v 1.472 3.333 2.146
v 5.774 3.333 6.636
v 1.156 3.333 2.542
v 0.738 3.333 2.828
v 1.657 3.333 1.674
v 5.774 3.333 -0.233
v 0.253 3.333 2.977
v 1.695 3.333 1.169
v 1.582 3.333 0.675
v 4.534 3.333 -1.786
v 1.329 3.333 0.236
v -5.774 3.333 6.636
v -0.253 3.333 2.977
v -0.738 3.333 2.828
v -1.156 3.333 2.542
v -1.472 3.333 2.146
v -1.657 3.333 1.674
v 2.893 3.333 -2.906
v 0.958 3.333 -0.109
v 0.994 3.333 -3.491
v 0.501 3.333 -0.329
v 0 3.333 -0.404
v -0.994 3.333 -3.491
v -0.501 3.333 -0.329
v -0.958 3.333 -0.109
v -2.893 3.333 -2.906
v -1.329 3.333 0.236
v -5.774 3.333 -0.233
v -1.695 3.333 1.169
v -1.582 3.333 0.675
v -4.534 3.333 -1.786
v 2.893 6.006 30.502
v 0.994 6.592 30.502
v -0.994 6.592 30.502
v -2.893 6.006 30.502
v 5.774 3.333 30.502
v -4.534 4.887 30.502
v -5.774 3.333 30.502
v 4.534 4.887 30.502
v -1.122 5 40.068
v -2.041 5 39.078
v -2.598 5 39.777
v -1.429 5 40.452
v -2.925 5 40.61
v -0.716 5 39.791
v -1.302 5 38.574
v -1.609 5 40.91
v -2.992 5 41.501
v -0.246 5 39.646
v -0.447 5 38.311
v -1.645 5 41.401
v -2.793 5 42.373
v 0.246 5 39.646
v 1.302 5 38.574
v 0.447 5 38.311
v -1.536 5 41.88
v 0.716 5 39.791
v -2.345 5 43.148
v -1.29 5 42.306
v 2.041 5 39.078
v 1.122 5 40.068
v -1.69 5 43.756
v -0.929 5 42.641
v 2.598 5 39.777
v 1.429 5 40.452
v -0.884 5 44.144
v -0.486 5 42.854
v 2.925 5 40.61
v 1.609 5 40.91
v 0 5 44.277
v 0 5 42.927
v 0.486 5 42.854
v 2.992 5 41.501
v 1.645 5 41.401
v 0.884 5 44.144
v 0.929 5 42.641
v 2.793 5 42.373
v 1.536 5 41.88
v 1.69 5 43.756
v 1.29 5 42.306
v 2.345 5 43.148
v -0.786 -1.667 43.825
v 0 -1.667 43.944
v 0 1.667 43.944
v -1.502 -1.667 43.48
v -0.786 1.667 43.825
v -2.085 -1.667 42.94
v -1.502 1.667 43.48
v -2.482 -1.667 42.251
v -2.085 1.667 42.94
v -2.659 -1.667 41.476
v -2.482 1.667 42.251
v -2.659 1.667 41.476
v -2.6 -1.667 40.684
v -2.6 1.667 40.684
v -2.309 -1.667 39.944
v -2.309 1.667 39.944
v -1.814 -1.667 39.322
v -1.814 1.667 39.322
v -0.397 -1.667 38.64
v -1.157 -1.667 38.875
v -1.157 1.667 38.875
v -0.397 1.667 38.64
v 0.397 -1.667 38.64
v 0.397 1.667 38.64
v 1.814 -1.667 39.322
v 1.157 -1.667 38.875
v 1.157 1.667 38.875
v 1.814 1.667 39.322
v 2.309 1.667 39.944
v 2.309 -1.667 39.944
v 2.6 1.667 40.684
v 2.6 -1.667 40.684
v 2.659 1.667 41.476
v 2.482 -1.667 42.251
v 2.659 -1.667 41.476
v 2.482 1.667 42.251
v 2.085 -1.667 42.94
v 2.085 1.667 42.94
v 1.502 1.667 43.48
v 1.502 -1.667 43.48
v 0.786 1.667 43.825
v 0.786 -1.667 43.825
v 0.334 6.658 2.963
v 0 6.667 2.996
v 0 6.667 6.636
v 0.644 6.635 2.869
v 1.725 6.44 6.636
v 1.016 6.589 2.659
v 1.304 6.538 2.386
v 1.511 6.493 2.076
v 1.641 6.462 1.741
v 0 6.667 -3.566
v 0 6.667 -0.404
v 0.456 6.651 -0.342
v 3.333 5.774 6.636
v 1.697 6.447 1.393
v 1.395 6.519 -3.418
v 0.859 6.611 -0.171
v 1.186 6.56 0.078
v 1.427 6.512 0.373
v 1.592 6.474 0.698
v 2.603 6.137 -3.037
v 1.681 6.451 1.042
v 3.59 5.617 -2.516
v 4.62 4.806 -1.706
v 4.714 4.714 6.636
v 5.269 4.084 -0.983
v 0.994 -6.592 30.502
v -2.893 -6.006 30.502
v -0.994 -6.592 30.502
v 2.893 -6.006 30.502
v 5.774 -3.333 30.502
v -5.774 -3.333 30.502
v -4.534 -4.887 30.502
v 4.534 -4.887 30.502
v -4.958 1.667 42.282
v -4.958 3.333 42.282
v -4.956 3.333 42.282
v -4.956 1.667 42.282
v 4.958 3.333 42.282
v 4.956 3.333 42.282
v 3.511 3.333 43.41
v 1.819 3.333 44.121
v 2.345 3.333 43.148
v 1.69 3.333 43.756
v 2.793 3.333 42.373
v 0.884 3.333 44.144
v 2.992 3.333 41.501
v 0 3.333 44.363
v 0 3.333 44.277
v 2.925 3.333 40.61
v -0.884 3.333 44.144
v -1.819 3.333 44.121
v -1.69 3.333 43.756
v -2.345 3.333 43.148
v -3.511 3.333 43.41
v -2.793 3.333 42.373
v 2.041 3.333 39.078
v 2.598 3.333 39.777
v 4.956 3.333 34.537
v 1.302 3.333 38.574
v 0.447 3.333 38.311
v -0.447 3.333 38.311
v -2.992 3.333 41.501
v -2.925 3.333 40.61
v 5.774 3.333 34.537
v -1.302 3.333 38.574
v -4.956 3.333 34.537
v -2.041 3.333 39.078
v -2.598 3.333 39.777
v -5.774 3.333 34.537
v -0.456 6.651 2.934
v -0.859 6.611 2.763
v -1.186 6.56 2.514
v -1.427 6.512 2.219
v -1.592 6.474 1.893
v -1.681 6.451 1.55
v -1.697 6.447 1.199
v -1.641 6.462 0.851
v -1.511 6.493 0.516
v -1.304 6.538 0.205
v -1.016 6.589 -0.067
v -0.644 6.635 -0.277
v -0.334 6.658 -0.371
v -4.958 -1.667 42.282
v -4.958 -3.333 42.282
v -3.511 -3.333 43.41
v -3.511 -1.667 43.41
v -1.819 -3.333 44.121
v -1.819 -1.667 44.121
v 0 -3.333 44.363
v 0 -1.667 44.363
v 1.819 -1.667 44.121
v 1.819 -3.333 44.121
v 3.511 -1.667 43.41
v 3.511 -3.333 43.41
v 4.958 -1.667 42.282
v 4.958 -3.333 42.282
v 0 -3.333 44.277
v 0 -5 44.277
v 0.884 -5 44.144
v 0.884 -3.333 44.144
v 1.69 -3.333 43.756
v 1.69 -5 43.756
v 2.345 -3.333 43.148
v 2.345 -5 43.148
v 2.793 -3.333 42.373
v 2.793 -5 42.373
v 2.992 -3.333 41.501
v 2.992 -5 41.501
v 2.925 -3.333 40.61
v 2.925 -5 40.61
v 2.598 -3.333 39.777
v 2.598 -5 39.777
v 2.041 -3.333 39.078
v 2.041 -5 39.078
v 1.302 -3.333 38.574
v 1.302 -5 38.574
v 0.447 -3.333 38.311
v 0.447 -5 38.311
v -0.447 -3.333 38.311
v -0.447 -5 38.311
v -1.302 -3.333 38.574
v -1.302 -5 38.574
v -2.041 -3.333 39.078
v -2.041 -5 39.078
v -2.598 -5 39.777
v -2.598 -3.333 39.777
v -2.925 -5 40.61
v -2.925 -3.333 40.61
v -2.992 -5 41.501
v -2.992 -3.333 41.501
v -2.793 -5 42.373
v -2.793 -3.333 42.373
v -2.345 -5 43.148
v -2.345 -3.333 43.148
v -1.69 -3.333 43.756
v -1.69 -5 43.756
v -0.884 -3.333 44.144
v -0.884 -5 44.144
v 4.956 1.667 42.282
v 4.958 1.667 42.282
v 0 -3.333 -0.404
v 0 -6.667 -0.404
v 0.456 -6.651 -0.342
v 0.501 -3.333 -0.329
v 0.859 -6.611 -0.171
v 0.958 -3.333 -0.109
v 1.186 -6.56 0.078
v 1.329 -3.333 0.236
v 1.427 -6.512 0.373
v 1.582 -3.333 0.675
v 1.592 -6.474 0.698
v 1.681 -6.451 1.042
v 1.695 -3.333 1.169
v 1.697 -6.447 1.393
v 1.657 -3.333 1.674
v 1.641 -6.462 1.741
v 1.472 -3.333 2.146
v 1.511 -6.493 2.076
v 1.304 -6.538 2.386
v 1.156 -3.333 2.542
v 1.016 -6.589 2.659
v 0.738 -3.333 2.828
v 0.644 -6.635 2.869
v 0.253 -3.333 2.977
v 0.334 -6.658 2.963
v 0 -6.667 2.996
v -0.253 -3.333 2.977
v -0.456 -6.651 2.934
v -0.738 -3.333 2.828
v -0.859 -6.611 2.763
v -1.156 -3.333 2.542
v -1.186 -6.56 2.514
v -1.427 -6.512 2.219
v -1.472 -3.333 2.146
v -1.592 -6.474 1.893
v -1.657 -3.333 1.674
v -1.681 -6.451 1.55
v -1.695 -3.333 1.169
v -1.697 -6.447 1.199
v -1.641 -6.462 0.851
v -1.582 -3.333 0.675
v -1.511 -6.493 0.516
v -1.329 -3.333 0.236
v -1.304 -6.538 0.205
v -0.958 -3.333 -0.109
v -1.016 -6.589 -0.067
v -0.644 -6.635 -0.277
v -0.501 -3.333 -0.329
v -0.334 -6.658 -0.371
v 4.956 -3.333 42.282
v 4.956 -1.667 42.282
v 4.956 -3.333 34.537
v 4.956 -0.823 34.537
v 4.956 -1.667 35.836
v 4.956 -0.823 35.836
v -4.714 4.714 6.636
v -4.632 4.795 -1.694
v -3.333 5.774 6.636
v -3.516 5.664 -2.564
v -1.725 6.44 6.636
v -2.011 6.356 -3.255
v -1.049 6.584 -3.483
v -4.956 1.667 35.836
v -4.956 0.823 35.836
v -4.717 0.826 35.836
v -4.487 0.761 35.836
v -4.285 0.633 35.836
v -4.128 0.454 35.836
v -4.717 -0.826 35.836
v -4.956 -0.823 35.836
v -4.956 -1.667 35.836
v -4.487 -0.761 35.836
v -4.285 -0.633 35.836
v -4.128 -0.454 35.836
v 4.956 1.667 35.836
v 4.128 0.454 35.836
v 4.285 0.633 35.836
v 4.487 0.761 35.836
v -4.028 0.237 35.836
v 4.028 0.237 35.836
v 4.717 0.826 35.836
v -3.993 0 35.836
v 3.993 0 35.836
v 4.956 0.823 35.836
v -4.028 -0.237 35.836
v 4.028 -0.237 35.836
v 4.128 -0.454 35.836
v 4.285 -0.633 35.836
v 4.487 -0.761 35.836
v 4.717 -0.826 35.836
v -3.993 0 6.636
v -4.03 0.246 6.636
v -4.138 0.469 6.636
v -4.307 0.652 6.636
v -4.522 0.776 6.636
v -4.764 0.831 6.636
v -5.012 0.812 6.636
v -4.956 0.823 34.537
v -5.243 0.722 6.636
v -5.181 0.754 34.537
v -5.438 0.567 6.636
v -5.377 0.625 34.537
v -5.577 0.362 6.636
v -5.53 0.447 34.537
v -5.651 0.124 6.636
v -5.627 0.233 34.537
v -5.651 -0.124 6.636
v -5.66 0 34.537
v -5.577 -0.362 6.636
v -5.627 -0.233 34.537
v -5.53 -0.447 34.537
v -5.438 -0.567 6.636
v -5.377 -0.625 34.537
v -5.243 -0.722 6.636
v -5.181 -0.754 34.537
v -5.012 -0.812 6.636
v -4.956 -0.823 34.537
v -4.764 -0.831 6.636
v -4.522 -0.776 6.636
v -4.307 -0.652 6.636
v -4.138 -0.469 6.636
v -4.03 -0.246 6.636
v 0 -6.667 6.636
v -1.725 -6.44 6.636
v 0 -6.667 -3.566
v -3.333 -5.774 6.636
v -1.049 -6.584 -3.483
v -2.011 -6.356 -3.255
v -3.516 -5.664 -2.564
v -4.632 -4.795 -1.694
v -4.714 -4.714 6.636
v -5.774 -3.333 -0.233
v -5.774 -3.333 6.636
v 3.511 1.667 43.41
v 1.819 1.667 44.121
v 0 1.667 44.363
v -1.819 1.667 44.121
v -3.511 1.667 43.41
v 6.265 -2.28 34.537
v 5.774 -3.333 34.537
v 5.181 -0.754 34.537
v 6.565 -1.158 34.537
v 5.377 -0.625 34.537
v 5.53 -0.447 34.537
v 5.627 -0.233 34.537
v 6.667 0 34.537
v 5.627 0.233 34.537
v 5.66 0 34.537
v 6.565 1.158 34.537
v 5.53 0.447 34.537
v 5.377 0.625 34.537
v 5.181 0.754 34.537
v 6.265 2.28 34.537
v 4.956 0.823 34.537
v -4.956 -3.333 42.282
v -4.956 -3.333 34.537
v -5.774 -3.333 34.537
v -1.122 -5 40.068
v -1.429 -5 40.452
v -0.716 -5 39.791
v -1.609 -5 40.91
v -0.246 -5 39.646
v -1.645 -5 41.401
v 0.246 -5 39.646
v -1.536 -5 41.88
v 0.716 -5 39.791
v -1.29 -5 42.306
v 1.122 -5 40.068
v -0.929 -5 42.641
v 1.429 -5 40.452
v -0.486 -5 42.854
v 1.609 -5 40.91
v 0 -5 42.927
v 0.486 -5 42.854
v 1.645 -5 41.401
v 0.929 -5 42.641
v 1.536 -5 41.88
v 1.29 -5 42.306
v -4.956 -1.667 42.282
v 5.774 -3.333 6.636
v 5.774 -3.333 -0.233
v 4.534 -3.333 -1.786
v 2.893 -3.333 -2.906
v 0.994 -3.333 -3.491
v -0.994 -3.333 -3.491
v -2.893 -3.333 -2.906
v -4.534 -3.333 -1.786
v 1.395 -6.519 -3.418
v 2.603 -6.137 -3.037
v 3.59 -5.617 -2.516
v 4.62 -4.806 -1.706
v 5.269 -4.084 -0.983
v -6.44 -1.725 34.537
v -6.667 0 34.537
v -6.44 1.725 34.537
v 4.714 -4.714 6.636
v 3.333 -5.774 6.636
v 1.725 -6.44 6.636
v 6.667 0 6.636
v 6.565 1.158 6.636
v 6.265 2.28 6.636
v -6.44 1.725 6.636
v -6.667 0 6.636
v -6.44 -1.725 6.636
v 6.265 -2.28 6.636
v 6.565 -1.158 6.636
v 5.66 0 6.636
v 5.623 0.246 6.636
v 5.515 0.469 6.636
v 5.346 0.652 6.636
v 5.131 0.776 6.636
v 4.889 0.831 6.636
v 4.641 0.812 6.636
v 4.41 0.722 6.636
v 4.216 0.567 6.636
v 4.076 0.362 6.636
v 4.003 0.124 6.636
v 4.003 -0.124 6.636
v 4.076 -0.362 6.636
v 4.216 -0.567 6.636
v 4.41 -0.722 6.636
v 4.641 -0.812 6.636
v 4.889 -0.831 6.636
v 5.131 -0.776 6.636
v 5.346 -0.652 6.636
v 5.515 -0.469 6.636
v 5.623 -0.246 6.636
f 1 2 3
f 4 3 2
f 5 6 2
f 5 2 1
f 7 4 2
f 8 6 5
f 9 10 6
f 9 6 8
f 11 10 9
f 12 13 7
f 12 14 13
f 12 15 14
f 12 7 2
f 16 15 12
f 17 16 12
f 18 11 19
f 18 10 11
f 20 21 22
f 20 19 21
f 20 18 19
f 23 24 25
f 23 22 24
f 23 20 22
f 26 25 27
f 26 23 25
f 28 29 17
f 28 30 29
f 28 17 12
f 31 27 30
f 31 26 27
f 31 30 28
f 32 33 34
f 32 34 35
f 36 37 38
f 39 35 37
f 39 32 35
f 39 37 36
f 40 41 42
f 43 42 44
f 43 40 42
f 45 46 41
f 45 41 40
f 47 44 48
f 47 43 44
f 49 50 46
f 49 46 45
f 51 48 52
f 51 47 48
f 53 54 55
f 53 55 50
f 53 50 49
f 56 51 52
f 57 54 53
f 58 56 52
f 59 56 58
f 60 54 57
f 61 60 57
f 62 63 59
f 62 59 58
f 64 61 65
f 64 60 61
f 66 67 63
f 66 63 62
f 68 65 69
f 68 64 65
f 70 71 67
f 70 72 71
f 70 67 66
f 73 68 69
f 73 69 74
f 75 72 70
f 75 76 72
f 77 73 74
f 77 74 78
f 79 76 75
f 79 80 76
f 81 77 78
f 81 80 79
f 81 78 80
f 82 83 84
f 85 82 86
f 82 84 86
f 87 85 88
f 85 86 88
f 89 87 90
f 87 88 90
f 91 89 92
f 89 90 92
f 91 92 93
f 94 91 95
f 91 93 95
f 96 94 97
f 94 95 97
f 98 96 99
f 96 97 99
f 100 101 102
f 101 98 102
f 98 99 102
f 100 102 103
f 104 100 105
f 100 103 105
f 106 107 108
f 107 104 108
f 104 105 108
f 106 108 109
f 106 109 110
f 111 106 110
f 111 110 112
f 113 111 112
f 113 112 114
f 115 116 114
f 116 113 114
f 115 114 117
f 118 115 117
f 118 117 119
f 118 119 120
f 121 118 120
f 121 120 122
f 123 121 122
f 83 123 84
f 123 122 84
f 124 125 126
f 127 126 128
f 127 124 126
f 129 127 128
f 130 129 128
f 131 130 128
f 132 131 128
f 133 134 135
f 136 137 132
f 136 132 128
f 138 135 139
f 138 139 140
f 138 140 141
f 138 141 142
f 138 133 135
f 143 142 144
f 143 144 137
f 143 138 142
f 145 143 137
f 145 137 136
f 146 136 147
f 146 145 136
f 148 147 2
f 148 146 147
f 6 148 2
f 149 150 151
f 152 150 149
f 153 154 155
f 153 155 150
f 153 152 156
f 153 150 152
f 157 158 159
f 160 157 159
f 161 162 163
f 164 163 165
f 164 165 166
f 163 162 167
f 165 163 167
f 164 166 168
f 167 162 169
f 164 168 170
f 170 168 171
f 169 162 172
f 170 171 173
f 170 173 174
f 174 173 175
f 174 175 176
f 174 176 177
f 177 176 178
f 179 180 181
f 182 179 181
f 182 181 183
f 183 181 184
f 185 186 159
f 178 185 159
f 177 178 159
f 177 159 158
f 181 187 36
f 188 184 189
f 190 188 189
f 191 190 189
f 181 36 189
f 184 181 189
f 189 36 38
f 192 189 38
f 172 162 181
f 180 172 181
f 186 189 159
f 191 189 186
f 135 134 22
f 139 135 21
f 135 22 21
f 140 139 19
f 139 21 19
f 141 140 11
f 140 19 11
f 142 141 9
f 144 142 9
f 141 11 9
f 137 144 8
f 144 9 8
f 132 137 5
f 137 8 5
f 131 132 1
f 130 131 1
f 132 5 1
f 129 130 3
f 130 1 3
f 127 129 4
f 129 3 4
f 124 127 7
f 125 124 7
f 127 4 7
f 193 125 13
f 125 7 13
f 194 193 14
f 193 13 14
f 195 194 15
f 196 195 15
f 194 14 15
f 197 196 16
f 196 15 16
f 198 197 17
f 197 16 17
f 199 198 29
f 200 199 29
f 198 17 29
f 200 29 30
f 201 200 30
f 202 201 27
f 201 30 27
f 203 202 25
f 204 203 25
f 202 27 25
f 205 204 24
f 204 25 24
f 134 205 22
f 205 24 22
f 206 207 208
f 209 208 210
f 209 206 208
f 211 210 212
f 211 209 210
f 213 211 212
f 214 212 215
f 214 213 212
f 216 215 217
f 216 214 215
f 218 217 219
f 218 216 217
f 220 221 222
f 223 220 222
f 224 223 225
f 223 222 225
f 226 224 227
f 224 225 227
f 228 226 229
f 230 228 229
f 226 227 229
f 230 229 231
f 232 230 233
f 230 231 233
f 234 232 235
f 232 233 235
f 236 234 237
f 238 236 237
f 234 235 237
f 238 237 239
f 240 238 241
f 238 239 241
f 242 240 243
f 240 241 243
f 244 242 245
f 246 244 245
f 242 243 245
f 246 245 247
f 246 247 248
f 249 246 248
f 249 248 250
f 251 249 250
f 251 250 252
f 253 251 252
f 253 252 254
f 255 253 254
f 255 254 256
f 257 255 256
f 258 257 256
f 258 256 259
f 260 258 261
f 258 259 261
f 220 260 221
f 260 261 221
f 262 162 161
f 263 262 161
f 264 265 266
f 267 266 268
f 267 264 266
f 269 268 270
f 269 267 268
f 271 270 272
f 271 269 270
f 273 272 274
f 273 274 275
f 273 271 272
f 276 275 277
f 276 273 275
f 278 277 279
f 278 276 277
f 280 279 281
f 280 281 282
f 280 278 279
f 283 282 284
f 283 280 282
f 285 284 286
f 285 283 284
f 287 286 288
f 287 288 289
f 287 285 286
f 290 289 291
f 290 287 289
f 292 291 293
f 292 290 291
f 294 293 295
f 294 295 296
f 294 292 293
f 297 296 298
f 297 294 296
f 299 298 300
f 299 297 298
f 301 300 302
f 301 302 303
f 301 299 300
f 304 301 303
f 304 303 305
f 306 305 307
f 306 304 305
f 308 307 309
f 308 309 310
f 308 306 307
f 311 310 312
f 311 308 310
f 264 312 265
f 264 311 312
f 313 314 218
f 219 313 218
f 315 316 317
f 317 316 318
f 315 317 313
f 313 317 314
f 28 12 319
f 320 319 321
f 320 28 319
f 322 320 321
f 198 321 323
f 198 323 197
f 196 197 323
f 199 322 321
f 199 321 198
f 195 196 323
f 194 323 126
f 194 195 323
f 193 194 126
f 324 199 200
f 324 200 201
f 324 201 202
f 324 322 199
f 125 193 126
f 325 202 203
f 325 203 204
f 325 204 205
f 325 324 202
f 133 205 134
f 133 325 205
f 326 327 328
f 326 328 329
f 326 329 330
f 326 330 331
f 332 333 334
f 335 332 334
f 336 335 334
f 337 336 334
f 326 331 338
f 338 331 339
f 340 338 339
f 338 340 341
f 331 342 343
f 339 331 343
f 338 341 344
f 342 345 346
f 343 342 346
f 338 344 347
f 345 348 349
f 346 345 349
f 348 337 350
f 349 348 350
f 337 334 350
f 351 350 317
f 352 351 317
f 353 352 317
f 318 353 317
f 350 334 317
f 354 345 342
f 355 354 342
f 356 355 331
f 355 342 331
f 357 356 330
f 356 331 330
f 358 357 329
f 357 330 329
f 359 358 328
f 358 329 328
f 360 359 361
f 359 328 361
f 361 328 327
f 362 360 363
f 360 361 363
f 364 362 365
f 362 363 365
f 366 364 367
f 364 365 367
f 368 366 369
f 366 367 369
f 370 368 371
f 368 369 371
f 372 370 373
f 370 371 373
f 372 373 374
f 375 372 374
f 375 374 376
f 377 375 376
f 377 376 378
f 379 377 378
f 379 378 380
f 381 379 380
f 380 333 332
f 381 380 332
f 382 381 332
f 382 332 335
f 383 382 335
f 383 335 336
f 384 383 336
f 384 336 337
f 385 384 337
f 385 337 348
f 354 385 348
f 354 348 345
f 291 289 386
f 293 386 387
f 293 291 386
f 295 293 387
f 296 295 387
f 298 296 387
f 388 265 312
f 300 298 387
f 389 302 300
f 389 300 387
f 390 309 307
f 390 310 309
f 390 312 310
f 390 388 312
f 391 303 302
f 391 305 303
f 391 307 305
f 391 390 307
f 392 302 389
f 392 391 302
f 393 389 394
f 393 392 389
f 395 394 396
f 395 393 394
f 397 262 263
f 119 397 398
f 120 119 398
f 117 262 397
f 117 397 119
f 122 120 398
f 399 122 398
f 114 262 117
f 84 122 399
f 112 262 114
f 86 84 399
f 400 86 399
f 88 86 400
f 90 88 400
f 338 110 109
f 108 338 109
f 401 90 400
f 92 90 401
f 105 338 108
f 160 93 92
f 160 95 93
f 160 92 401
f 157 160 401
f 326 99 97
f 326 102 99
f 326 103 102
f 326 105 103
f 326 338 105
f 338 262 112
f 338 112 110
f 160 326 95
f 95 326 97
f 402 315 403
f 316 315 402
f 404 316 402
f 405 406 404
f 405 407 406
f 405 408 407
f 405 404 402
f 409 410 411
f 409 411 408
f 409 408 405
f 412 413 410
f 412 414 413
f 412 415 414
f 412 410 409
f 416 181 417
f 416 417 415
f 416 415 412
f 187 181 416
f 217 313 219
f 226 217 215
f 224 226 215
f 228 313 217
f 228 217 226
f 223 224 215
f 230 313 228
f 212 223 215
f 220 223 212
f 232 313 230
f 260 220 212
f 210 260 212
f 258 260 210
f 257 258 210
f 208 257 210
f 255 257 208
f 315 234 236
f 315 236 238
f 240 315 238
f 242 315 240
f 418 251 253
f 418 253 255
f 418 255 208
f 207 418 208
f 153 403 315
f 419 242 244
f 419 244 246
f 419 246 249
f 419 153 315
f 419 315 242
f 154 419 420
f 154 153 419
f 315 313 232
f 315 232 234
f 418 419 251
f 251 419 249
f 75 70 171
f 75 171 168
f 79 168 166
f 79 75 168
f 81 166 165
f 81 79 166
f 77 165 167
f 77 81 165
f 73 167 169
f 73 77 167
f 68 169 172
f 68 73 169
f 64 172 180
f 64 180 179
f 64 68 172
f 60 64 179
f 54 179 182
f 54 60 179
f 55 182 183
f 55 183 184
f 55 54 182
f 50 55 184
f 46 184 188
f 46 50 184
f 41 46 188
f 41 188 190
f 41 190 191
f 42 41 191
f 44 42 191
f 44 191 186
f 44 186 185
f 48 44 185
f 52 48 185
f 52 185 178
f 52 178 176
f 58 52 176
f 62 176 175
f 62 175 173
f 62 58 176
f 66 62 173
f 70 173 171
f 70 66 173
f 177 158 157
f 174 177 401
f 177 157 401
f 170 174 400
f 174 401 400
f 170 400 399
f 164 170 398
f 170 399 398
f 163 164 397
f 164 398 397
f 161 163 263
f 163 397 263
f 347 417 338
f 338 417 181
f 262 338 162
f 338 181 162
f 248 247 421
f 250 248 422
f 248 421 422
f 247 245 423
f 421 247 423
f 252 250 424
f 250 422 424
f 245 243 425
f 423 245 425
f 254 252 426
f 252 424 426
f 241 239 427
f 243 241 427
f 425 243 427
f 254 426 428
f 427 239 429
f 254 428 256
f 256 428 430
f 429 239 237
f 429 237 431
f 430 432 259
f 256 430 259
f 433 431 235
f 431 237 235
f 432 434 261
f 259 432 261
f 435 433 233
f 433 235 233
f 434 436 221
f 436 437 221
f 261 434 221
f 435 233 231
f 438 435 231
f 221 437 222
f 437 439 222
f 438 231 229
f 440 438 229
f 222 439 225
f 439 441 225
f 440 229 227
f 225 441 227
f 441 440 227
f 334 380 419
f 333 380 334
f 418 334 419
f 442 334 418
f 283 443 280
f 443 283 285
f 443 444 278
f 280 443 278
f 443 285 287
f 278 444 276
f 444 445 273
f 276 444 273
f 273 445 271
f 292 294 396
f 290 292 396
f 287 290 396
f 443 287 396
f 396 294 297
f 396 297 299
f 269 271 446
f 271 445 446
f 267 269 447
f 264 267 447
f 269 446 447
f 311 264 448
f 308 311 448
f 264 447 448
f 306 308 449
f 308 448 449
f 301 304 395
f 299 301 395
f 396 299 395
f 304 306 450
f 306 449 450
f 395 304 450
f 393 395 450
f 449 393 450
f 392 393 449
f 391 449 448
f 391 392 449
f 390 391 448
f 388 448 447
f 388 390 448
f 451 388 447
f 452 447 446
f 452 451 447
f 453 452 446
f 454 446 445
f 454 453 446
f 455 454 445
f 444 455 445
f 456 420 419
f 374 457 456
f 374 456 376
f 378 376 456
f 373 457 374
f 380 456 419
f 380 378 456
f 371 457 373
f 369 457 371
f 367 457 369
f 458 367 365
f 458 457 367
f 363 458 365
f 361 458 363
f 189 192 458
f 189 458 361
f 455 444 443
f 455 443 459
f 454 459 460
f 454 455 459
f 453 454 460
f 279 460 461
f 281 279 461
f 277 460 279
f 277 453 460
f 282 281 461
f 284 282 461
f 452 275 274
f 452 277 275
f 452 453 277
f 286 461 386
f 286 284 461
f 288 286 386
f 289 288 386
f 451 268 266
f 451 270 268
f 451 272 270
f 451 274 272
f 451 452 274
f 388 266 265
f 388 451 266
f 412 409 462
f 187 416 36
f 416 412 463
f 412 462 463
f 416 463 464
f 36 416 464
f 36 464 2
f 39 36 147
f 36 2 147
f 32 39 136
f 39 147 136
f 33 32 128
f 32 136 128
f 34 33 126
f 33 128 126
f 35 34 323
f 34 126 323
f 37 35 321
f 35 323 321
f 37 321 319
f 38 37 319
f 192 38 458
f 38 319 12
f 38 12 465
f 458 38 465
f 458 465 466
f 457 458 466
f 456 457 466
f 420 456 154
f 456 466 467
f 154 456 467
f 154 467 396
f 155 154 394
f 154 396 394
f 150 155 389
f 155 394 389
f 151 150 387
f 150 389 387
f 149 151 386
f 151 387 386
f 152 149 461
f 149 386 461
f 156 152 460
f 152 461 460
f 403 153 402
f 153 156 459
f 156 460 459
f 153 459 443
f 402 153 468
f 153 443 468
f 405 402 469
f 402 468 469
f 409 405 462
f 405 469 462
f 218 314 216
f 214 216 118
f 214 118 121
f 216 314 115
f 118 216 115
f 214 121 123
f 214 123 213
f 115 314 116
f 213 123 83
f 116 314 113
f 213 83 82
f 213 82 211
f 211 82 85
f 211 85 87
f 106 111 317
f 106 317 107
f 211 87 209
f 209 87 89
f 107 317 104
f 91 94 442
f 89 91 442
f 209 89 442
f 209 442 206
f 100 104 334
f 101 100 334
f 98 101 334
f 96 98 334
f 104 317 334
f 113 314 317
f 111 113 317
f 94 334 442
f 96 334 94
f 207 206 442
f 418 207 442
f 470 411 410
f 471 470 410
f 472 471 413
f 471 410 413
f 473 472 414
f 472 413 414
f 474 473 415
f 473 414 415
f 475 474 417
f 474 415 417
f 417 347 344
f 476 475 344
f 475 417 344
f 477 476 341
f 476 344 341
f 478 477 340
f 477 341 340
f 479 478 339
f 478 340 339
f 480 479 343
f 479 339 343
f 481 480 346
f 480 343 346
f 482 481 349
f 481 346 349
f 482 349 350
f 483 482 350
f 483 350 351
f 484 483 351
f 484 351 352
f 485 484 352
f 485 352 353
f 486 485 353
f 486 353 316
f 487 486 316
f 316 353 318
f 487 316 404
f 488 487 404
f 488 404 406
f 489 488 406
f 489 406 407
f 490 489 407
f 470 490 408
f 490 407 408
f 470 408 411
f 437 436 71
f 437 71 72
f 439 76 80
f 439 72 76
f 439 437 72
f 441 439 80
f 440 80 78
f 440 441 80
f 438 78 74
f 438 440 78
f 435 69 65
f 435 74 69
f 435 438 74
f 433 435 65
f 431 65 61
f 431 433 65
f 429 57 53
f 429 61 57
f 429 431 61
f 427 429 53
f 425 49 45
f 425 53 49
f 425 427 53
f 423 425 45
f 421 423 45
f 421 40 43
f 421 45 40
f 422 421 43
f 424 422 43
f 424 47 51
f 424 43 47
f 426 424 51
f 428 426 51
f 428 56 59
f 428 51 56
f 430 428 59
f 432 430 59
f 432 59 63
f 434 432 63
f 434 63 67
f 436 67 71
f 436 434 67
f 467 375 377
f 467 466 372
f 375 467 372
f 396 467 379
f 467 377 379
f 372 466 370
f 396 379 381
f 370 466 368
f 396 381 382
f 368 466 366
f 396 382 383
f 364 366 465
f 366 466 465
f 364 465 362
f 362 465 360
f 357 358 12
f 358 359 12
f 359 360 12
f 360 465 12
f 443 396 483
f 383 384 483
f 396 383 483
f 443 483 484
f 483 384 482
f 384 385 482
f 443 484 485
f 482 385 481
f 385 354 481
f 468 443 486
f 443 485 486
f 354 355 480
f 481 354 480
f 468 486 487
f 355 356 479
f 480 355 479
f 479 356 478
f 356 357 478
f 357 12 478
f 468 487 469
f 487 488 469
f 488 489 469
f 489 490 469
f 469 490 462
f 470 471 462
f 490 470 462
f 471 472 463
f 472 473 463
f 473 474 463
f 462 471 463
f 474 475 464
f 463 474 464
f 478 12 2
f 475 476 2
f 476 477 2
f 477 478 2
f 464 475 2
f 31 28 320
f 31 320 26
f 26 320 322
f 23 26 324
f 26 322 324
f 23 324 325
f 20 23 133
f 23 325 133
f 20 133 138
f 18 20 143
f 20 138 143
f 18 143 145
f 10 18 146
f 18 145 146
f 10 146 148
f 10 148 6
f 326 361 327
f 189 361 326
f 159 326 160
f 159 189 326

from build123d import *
from build123d.topology import SkipClean

# Parameters (mm, degrees)
SKETCH2_R                       = 10
PHALANGE_LENGTH_DEPTH           = 43.8
BOSS_EXTRUDE3_DEPTH             = 5
BOSS_EXTRUDE4_DEPTH             = 5
BOSS_EXTRUDE4_DEPTH_BACK        = 5
CUT_EXTRUDE2_START              = -15.3025
CUT_EXTRUDE2_DEPTH              = 15.3025
SKETCH7_R                       = 1.65
CUT_EXTRUDE3_DEPTH              = 10
CUT_EXTRUDE4_DEPTH              = 2.5
CUT_EXTRUDE4_DEPTH_BACK         = 2.5
CUT_EXTRUDE7_REACH              = 63.838
SKETCH4_R                       = 1.65
CUT_EXTRUDE7_DIRECTION_2_REACH  = 63.838
CUT_EXTRUDE_THIN1_START         = 43.8
CUT_EXTRUDE_THIN1_DEPTH         = 10.361670454
BOSS_EXTRUDE5_REACH             = 63.28
SKETCH9_R                       = 4
SKETCH9_R_2                     = 1.65
CUT_EXTRUDE8_REACH              = 62.771
SKETCH10_R                      = 1.25
CUT_EXTRUDE9_START              = -8
CUT_EXTRUDE9_DEPTH              = 8
CUT_EXTRUDE10_REACH             = 63.28
CUT_EXTRUDE10_DIRECTION_2_REACH = 63.28
CUT_EXTRUDE11_START             = -10
CUT_EXTRUDE11_OUTLINE_W         = 2.565773848
CUT_EXTRUDE11_OUTLINE_H         = 11.6166929
CUT_EXTRUDE11_DEPTH             = 10
BOSS_EXTRUDE6_START             = 7.5
SKETCH14_R                      = 4.5
SKETCH14_R_2                    = 1.65
BOSS_EXTRUDE6_DEPTH             = 2.5
BOSS_EXTRUDE7_START             = -7.5
SKETCH14_2_R                    = 4.5
SKETCH14_2_R_2                  = 1.65
BOSS_EXTRUDE7_DEPTH             = 2.5
SCALE1_SCALE                    = 0.666666667
CUT_EXTRUDE12_START             = -11.666667
SKETCH15_R                      = 1.65
CUT_EXTRUDE12_DEPTH             = 13.333339
CUT_EXTRUDE13_REACH             = 47.962
SKETCH16_R                      = 1.7
CUT_EXTRUDE13_DIRECTION_2_REACH = 47.962


# Read off the part's stored shape, not the designer's step: Cut-Extrude-Thin1, Cut-Extrude11
with BuildPart() as part:
    # Sketch2 → Phalange Length (new body)
    with BuildSketch(Plane.XY):
        Circle(SKETCH2_R)
    extrude(amount=PHALANGE_LENGTH_DEPTH)

    # Sketch3 → Boss-Extrude3 (add)
    with BuildSketch(Plane(origin=(0, -10, 0), x_dir=(-1, 0, 0), z_dir=(0, -1, 0))):
        with BuildLine():
            Line((-10, 5.302499701), (-10, 0))
            Line((-10, 0), (10, 0))
            Line((10, 0), (10, 5.302499701))
            ThreePointArc((10, 5.302499701), (0, 15.302499701), (-10, 5.302499701))
        make_face()
    boss_extrude3 = extrude(amount=-BOSS_EXTRUDE3_DEPTH)

    # Mirror1: Boss-Extrude3 across plane
    add(boss_extrude3.mirror(Plane.ZX))

    # Sketch5 → Boss-Extrude4 (add, two sides: drawn at the far end of the back side and taken through both)
    with BuildSketch(Plane(origin=(0, 0, 0), x_dir=(1, 0, 0), z_dir=(0, 1, 0)).offset(-BOSS_EXTRUDE4_DEPTH_BACK)):
        with BuildLine():
            Line((-10, -49.583157911), (-10, -43.8))
            Line((-10, -43.8), (10, -43.8))
            Line((10, -43.8), (10, -49.583157911))
            ThreePointArc((10, -49.583157911), (0, -59.151984156), (-10, -49.583157911))
        make_face()
    extrude(amount=BOSS_EXTRUDE4_DEPTH + BOSS_EXTRUDE4_DEPTH_BACK)

    # Sketch6 → Cut-Extrude2 (cut)
    with SkipClean():  # the faces are left unmerged after this step: merging them gives an invalid solid
        with BuildSketch(Plane.XY.offset(CUT_EXTRUDE2_START)):
            with BuildLine():
                ThreePointArc((0, 10), (5, 8.660254038), (8.660254038, 5))
                Line((8.660254038, 5), (10, 5))
                Line((10, 5), (10, 10))
                Line((10, 10), (0, 10))
            make_face()
            with BuildLine():
                Line((10, -5), (8.660254038, -5))
                ThreePointArc((8.660254038, -5), (5, -8.660254038), (0, -10))
                Line((0, -10), (10, -10))
                Line((10, -10), (10, -5))
            make_face()
            with BuildLine():
                ThreePointArc((-8.660254038, 5), (-5, 8.660254038), (0, 10))
                Line((0, 10), (-10, 10))
                Line((-10, 10), (-10, 5))
                Line((-10, 5), (-8.660254038, 5))
            make_face()
            with BuildLine():
                Line((-10, -10), (0, -10))
                ThreePointArc((0, -10), (-5, -8.660254038), (-8.660254038, -5))
                Line((-8.660254038, -5), (-10, -5))
                Line((-10, -5), (-10, -10))
            make_face()
        extrude(amount=CUT_EXTRUDE2_DEPTH, mode=Mode.SUBTRACT)

    # Sketch7 → Cut-Extrude3 (cut)
    with SkipClean():  # the faces are left unmerged after this step: merging them gives an invalid solid
        with BuildSketch(Plane(origin=(0, 5, 0), x_dir=(1, 0, 0), z_dir=(0, 1, 0))):
            with Locations(Location((0, -51.961984156, 0), (0, 0, 270))):
                Circle(SKETCH7_R)
        extrude(amount=-CUT_EXTRUDE3_DEPTH, mode=Mode.SUBTRACT)

    # Sketch5<2> → Cut-Extrude4 (cut, two sides: drawn at the far end of the back side and taken through both)
    with BuildSketch(Plane(origin=(0, 0, 0), x_dir=(1, 0, 0), z_dir=(0, 1, 0)).offset(-CUT_EXTRUDE4_DEPTH_BACK)):
        with BuildLine():
            Line((-10, -49.583157911), (-10, -43.8))
            Line((-10, -43.8), (10, -43.8))
            Line((10, -43.8), (10, -49.583157911))
            ThreePointArc((10, -49.583157911), (0, -59.151984156), (-10, -49.583157911))
        make_face()
    extrude(amount=CUT_EXTRUDE4_DEPTH + CUT_EXTRUDE4_DEPTH_BACK, mode=Mode.SUBTRACT)

    # Sketch4 → Cut-Extrude7 (cut, up to next)
    with BuildSketch(Plane(origin=(0, -5, 0), x_dir=(1, 0, 0), z_dir=(0, 1, 0)), mode=Mode.PRIVATE) as cut_extrude7_sk1:
        with Locations(Location((0, 8.010159673, 0), (0, 0, 270))):
            Circle(SKETCH4_R)
    cut_extrude7_tool1 = extrude(cut_extrude7_sk1.sketch, amount=-CUT_EXTRUDE7_REACH, mode=Mode.PRIVATE) & part.part
    add(cut_extrude7_tool1.solids().sort_by_distance((0, -5, -8.01016))[0], mode=Mode.SUBTRACT)

    # Sketch4 → Cut-Extrude7 direction 2 (cut, up to next)
    with BuildSketch(Plane(origin=(0, -5, 0), x_dir=(1, 0, 0), z_dir=(0, 1, 0)), mode=Mode.PRIVATE) as cut_extrude7_direction_2_sk1:
        with Locations(Location((0, 8.010159673, 0), (0, 0, 270))):
            Circle(SKETCH4_R)
    cut_extrude7_direction_2_tool1 = extrude(cut_extrude7_direction_2_sk1.sketch, amount=CUT_EXTRUDE7_DIRECTION_2_REACH, mode=Mode.PRIVATE) & part.part
    add(cut_extrude7_direction_2_tool1.solids().sort_by_distance((0, -5, -8.01016))[0], mode=Mode.SUBTRACT)

    # Cut-Extrude-Thin1 outline → Cut-Extrude-Thin1 (cut)
    with SkipClean():  # the faces are left unmerged after this step: merging them gives an invalid solid
        with BuildSketch(Plane.XY.offset(CUT_EXTRUDE_THIN1_START)):
            with BuildLine():
                ThreePointArc((8.660254038, 5), (9.256147934, 3.78466979), (9.682458366, 2.5))
                Line((9.682458366, 2.5), (10, 2.5))
                Line((10, 2.5), (10, 5))
                Line((10, 5), (8.660254038, 5))
            make_face()
            with BuildLine():
                Line((10, -2.5), (9.682458366, -2.5))
                ThreePointArc((9.682458366, -2.5), (9.256147934, -3.78466979), (8.660254038, -5))
                Line((8.660254038, -5), (10, -5))
                Line((10, -5), (10, -2.5))
            make_face()
            with BuildLine():
                Line((-10, 2.5), (-9.682458366, 2.5))
                ThreePointArc((-9.682458366, 2.5), (-9.256147934, 3.78466979), (-8.660254038, 5))
                Line((-8.660254038, 5), (-10, 5))
                Line((-10, 5), (-10, 2.5))
            make_face()
            with BuildLine():
                ThreePointArc((-8.660254038, -5), (-9.256147934, -3.78466979), (-9.682458366, -2.5))
                Line((-9.682458366, -2.5), (-10, -2.5))
                Line((-10, -2.5), (-10, -5))
                Line((-10, -5), (-8.660254038, -5))
            make_face()
        extrude(amount=CUT_EXTRUDE_THIN1_DEPTH, mode=Mode.SUBTRACT)

    # Sketch9 → Boss-Extrude5 (add, up to next)
    with BuildSketch(Plane.XZ.offset(-2.5), mode=Mode.PRIVATE) as boss_extrude5_sk1:
        with Locations(Location((0, 51.961984156, 0), (0, 0, 90))):
            Circle(SKETCH9_R)
        with Locations(Location((0, 51.961984156, 0), (0, 0, 90))):
            Circle(SKETCH9_R_2, mode=Mode.SUBTRACT)
    boss_extrude5_tool1 = extrude(boss_extrude5_sk1.sketch, amount=BOSS_EXTRUDE5_REACH, mode=Mode.PRIVATE) - part.part
    add(boss_extrude5_tool1.solids().sort_by_distance((0, 2.5, 48.075121))[0])

    # Sketch10 → Cut-Extrude8 (cut, up to next)
    with BuildSketch(Plane.XY.offset(43.8), mode=Mode.PRIVATE) as cut_extrude8_sk1:
        with Locations((7.239961745, 0)):
            Circle(SKETCH10_R)
    cut_extrude8_tool1 = extrude(cut_extrude8_sk1.sketch, amount=-CUT_EXTRUDE8_REACH, mode=Mode.PRIVATE) & part.part
    # Sketch10 → Cut-Extrude8 (cut, up to next)
    with BuildSketch(Plane.XY.offset(43.8), mode=Mode.PRIVATE) as cut_extrude8_sk2:
        with Locations((-7.239961745, 0)):
            Circle(SKETCH10_R)
    cut_extrude8_tool2 = extrude(cut_extrude8_sk2.sketch, amount=-CUT_EXTRUDE8_REACH, mode=Mode.PRIVATE) & part.part
    add(cut_extrude8_tool1.solids().sort_by_distance((7.239962, 0, 43.8))[0], mode=Mode.SUBTRACT)
    add(cut_extrude8_tool2.solids().sort_by_distance((-7.239962, 0, 43.8))[0], mode=Mode.SUBTRACT)

    # Sketch11 → Cut-Extrude9 (cut)
    with SkipClean():  # the faces are left unmerged after this step: merging them gives an invalid solid
        with BuildSketch(Plane.XY.offset(43.8).offset(CUT_EXTRUDE9_START)):
            with BuildLine():
                ThreePointArc((8.660254038, 5), (0, 10), (-8.660254038, 5))
                Line((-8.660254038, 5), (8.660254038, 5))
            make_face()
            with BuildLine():
                Line((8.660254038, -5), (-8.660254038, -5))
                ThreePointArc((-8.660254038, -5), (0, -10), (8.660254038, -5))
            make_face()
        extrude(amount=CUT_EXTRUDE9_DEPTH, mode=Mode.SUBTRACT)

    # Sketch12 → Cut-Extrude10 (cut, up to next)
    with BuildSketch(Plane.XZ.offset(-2.5), mode=Mode.PRIVATE) as cut_extrude10_sk1:
        with BuildLine():
            ThreePointArc((0, 59.151984156), (-5.99753031, 57.15625831), (-9.603498629, 51.964892021))
            Line((-9.603498629, 51.964892021), (-8.660254038, 51.964892021))
            ThreePointArc((-8.660254038, 51.964892021), (0, 56.590740593), (8.660254038, 51.964892021))
            Line((8.660254038, 51.964892021), (9.603498629, 51.964892021))
            ThreePointArc((9.603498629, 51.964892021), (5.99753031, 57.15625831), (0, 59.151984156))
        make_face()
    cut_extrude10_tool1 = extrude(cut_extrude10_sk1.sketch, amount=CUT_EXTRUDE10_REACH, mode=Mode.PRIVATE) & part.part
    add(cut_extrude10_tool1.solids().sort_by_distance((5.874655, 2.5, 56.99207))[0], mode=Mode.SUBTRACT)

    # Sketch12 → Cut-Extrude10 direction 2 (cut, up to next)
    with BuildSketch(Plane.XZ.offset(-2.5), mode=Mode.PRIVATE) as cut_extrude10_direction_2_sk1:
        with BuildLine():
            ThreePointArc((0, 59.151984156), (-5.99753031, 57.15625831), (-9.603498629, 51.964892021))
            Line((-9.603498629, 51.964892021), (-8.660254038, 51.964892021))
            ThreePointArc((-8.660254038, 51.964892021), (0, 56.590740593), (8.660254038, 51.964892021))
            Line((8.660254038, 51.964892021), (9.603498629, 51.964892021))
            ThreePointArc((9.603498629, 51.964892021), (5.99753031, 57.15625831), (0, 59.151984156))
        make_face()
    cut_extrude10_direction_2_tool1 = extrude(cut_extrude10_direction_2_sk1.sketch, amount=-CUT_EXTRUDE10_DIRECTION_2_REACH, mode=Mode.PRIVATE) & part.part
    add(cut_extrude10_direction_2_tool1.solids().sort_by_distance((5.874655, 2.5, 56.99207))[0], mode=Mode.SUBTRACT)

    # Cut-Extrude11 outline → Cut-Extrude11 (cut)
    with BuildSketch(Plane.XZ.offset(5).offset(CUT_EXTRUDE11_START)):
        with Locations((-8.717113076, 47.660571369)):
            Rectangle(CUT_EXTRUDE11_OUTLINE_W, CUT_EXTRUDE11_OUTLINE_H)
        with Locations((8.717113076, 47.660571369)):
            Rectangle(CUT_EXTRUDE11_OUTLINE_W, CUT_EXTRUDE11_OUTLINE_H)
    extrude(amount=CUT_EXTRUDE11_DEPTH, mode=Mode.SUBTRACT)

    # Sketch14 → Boss-Extrude6 (add)
    with SkipClean():  # the faces are left unmerged after this step: merging them gives an invalid solid
        with BuildSketch(Plane(origin=(0, 0, 0), x_dir=(1, 0, 0), z_dir=(0, 1, 0)).offset(BOSS_EXTRUDE6_START)):
            with Locations(Location((0, -51.961984156, 0), (0, 0, 270))):
                Circle(SKETCH14_R)
            with Locations(Location((0, -51.961984156, 0), (0, 0, 270))):
                Circle(SKETCH14_R_2, mode=Mode.SUBTRACT)
        extrude(amount=-BOSS_EXTRUDE6_DEPTH)

    # Sketch14<2> → Boss-Extrude7 (add)
    with SkipClean():  # the faces are left unmerged after this step: merging them gives an invalid solid
        with BuildSketch(Plane(origin=(0, 0, 0), x_dir=(1, 0, 0), z_dir=(0, 1, 0)).offset(BOSS_EXTRUDE7_START)):
            with Locations(Location((0, -51.961984156, 0), (0, 0, 270))):
                Circle(SKETCH14_2_R)
            with Locations(Location((0, -51.961984156, 0), (0, 0, 270))):
                Circle(SKETCH14_2_R_2, mode=Mode.SUBTRACT)
        extrude(amount=BOSS_EXTRUDE7_DEPTH)


with BuildPart() as part_1:
    # Scale1: scaled about (0, 4.7e-08, 19.907417167)
    add(part.part.scale(SCALE1_SCALE).moved(Location((0, 1.6e-08, 6.635805722))))

    # Sketch15 → Cut-Extrude12 (cut)
    with BuildSketch(Plane(origin=(0, 4.999994984, 0), x_dir=(1, 0, 0), z_dir=(0, 1, 0)).offset(CUT_EXTRUDE12_START)):
        with Locations(Location((-4.7e-08, -41.277297094, 0), (0, 0, 270))):
            Circle(SKETCH15_R)
    extrude(amount=CUT_EXTRUDE12_DEPTH, mode=Mode.SUBTRACT)

    # Sketch16 → Cut-Extrude13 (cut, up to next)
    with BuildSketch(Plane.XZ.offset(-3.333328317), mode=Mode.PRIVATE) as cut_extrude13_sk1:
        with Locations(Location((-4.7e-08, 1.295867875, 0), (0, 0, 270))):
            Circle(SKETCH16_R)
    cut_extrude13_tool1 = extrude(cut_extrude13_sk1.sketch, amount=-CUT_EXTRUDE13_REACH, mode=Mode.PRIVATE) & part_1.part
    add(cut_extrude13_tool1.solids().sort_by_distance((0, 3.333328, 1.295868))[0], mode=Mode.SUBTRACT)

    # Sketch16 → Cut-Extrude13 direction 2 (cut, up to next)
    with BuildSketch(Plane.XZ.offset(-3.333328317), mode=Mode.PRIVATE) as cut_extrude13_direction_2_sk1:
        with Locations(Location((-4.7e-08, 1.295867875, 0), (0, 0, 270))):
            Circle(SKETCH16_R)
    cut_extrude13_direction_2_tool1 = extrude(cut_extrude13_direction_2_sk1.sketch, amount=CUT_EXTRUDE13_DIRECTION_2_REACH, mode=Mode.PRIVATE) & part_1.part
    add(cut_extrude13_direction_2_tool1.solids().sort_by_distance((0, 3.333328, 1.295868))[0], mode=Mode.SUBTRACT)


solid = part_1.part
